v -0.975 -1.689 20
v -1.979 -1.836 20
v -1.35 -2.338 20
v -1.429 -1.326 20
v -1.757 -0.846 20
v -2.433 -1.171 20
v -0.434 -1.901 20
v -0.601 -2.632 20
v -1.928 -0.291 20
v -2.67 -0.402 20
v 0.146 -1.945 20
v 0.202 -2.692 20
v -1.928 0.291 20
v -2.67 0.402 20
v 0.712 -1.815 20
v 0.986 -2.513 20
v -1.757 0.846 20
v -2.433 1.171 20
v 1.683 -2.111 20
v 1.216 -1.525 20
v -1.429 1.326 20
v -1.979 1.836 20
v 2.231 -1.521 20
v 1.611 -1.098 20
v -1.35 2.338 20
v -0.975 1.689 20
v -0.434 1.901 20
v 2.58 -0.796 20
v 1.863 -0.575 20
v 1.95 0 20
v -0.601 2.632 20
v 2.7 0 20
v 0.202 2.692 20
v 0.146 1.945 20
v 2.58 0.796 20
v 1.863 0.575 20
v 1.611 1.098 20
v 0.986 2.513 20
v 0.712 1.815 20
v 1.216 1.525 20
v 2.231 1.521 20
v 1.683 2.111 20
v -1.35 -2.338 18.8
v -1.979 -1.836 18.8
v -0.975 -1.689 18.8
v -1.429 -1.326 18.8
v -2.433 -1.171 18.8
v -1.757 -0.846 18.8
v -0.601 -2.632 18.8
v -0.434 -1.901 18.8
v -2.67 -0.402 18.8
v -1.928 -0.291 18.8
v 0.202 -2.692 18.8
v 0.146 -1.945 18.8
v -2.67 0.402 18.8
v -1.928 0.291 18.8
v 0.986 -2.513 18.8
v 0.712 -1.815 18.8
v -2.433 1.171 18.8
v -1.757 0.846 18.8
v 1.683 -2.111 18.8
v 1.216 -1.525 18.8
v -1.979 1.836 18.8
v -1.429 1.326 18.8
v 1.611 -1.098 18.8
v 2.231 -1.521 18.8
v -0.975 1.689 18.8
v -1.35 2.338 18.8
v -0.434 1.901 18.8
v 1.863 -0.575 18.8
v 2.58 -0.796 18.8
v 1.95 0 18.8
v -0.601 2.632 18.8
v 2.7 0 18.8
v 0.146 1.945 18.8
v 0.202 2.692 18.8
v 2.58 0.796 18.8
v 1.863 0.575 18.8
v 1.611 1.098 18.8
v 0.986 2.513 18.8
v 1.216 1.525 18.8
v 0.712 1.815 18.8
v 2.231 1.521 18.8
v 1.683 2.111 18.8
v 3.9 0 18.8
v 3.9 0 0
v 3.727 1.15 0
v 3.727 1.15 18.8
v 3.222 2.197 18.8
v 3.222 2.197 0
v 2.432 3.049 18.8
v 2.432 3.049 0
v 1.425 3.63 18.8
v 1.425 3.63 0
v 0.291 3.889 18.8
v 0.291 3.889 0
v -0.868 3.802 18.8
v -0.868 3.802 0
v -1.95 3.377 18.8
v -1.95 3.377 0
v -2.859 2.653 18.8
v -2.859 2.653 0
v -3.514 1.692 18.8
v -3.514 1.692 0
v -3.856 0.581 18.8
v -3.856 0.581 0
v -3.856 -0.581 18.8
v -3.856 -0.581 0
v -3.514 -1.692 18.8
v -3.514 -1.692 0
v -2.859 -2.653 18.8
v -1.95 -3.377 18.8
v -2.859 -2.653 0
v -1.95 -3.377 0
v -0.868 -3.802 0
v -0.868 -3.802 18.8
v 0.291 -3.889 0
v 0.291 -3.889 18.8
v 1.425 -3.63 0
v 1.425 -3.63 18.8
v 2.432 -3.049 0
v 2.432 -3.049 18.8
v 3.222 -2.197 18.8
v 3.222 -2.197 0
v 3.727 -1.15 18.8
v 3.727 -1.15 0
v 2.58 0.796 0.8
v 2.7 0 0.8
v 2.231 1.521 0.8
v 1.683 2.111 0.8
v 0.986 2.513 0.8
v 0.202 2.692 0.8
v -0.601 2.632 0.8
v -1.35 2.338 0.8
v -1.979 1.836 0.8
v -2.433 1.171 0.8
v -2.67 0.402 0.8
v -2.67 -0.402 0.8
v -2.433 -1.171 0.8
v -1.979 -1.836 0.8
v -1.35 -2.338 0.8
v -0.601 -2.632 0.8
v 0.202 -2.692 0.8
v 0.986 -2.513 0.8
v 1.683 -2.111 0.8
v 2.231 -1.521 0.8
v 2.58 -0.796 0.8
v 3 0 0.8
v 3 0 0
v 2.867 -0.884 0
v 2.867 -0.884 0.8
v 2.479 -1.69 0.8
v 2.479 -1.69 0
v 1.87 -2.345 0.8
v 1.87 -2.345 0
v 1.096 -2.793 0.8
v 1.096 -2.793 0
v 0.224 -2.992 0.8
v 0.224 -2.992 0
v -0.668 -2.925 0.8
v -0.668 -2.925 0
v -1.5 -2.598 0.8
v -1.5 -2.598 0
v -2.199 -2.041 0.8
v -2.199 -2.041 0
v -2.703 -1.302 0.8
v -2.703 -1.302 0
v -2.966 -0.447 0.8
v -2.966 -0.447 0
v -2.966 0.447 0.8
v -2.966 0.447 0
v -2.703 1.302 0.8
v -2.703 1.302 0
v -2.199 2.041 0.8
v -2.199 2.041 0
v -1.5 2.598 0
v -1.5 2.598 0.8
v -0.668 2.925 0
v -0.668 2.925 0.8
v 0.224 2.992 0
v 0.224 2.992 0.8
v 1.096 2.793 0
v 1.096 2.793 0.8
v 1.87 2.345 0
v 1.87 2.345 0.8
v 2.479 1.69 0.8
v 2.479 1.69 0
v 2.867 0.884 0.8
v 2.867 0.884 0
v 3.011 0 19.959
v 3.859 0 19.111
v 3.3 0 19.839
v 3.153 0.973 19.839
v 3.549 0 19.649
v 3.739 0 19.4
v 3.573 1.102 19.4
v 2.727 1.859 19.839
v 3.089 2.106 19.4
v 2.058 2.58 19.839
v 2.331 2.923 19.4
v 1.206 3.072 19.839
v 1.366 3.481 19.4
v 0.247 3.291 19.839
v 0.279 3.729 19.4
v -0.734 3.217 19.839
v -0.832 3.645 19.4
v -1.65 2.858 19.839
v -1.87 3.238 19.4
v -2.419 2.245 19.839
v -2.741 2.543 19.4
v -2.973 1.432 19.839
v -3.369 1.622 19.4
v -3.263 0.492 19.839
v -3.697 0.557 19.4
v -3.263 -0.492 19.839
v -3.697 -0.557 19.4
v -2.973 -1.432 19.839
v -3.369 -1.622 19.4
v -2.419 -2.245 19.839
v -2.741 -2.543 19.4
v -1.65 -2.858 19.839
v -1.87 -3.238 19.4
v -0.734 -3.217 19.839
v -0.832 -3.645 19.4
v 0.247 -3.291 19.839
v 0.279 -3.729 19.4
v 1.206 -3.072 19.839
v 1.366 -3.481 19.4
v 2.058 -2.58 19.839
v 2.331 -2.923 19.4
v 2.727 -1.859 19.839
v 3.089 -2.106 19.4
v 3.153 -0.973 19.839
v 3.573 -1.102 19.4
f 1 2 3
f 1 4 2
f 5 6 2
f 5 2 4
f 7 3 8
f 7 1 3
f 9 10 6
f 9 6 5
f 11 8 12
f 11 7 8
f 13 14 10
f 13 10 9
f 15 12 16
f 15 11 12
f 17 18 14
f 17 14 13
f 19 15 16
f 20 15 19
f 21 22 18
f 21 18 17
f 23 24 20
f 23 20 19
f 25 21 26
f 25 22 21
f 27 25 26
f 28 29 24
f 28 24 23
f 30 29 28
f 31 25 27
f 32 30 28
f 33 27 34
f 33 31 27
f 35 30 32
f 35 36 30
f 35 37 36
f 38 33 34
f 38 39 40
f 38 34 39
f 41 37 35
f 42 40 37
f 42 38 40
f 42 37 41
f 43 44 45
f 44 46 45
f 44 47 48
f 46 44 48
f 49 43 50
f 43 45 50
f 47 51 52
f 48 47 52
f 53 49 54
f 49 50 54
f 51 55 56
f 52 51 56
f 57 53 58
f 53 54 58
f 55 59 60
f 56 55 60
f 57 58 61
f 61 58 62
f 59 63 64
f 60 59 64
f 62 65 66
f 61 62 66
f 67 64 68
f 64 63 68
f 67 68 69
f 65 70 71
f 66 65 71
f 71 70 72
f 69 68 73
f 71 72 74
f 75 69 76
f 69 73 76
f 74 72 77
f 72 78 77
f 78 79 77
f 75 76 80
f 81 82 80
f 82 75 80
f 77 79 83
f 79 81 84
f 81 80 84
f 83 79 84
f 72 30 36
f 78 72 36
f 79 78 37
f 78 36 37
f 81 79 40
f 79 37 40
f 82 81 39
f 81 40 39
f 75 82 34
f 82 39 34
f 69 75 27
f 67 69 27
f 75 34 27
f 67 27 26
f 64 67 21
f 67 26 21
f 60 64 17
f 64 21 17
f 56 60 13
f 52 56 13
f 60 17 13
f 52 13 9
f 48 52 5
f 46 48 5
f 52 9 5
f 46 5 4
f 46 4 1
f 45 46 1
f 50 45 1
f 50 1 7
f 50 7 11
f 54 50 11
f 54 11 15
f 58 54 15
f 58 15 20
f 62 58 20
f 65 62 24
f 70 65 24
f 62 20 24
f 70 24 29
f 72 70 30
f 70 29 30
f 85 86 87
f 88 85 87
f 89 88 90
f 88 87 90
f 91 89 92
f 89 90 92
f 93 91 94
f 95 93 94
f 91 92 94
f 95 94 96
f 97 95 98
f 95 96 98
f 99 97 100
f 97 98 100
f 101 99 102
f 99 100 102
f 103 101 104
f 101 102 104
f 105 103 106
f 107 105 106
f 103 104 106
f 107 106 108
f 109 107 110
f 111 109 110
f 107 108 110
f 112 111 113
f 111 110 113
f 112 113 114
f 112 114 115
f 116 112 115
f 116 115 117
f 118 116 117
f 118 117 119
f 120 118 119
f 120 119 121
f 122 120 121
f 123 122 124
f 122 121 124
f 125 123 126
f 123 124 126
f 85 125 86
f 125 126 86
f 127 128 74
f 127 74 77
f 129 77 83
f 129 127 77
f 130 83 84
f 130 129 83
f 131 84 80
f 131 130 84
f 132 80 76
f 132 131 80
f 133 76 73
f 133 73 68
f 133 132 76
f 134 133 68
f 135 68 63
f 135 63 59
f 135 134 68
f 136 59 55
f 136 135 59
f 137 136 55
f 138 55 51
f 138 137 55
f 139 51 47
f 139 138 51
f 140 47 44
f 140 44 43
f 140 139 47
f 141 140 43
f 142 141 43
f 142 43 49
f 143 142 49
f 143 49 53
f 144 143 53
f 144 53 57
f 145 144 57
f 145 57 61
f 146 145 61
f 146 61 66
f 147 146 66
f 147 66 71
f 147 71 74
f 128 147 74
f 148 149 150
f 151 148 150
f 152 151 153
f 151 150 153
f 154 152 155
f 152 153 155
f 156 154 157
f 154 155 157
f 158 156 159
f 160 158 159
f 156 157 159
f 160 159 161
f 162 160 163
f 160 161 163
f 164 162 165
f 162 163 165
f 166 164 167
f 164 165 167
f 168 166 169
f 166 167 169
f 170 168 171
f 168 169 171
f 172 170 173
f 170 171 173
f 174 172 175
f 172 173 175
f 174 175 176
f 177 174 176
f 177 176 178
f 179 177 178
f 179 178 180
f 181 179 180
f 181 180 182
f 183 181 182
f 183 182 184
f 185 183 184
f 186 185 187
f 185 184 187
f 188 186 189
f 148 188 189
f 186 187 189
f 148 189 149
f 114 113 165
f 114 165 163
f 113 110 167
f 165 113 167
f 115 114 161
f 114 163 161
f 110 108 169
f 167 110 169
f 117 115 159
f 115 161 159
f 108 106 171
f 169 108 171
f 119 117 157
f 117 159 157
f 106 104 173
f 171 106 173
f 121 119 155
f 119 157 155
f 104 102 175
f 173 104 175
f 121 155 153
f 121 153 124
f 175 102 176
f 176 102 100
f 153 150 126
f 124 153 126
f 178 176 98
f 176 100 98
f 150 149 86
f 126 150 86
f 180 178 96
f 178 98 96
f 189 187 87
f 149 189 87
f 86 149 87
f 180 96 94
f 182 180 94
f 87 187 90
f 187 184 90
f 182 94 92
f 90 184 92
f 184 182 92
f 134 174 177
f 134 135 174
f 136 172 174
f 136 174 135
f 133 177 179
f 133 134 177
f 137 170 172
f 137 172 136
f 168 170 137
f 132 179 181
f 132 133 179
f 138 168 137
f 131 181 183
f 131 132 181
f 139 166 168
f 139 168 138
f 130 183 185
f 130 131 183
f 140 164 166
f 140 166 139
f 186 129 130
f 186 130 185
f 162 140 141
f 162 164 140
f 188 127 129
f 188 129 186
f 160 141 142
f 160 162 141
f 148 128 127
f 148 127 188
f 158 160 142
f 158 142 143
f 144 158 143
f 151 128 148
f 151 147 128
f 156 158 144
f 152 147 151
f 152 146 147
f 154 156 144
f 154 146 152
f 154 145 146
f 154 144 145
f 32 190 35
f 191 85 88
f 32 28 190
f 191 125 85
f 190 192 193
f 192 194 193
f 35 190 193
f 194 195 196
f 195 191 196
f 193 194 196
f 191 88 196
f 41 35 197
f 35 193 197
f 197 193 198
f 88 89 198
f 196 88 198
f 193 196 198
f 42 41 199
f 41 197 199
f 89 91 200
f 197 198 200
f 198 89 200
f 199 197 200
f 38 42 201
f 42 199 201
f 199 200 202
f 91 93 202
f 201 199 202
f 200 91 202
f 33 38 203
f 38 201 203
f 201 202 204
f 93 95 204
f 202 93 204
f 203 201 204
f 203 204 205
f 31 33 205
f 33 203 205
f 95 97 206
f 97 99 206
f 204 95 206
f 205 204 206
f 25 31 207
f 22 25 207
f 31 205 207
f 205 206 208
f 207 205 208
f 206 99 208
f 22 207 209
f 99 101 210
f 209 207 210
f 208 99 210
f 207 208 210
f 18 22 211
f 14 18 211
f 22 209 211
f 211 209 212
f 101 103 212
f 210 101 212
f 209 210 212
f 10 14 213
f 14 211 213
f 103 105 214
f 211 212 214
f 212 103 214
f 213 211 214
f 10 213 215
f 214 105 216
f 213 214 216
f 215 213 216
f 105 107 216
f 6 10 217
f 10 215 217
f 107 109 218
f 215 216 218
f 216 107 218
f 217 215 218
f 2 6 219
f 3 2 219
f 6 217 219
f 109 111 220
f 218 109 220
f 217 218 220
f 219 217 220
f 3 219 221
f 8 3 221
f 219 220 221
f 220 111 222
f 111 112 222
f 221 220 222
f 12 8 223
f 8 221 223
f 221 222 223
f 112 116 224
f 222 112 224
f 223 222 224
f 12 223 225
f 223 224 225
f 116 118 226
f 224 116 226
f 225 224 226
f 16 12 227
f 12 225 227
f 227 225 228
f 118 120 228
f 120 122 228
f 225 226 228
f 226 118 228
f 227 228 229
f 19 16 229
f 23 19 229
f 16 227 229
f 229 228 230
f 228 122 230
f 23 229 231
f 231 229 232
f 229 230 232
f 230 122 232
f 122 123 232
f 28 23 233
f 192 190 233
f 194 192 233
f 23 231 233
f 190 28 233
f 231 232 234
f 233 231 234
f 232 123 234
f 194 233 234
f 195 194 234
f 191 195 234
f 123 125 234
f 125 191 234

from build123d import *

# Parameters (mm, degrees)
F0_R     = 3.9
F0_R_2   = 2.7
F1_DEPTH = 20
F2_R     = 2.7
F2_R_2   = 1.95
F3_DEPTH = 1.2
F4_R     = 1.2
F5_R     = 3
F6_DEPTH = 0.8


with BuildPart() as f1:
    # F0 (on Top) → F1 (new body)
    with BuildSketch(Plane.XY):
        Circle(F0_R)
        Circle(F0_R_2, mode=Mode.SUBTRACT)
    extrude(amount=F1_DEPTH)

    # F2 (on face) → F3 (join)
    with BuildSketch(Plane.XY.offset(20)):
        Circle(F2_R)
        Circle(F2_R_2, mode=Mode.SUBTRACT)
    extrude(amount=-F3_DEPTH)

    # F4
    f4_edges = [f1.edges().sort_by_distance(p)[0] for p in [
        (-3.9, 0, 20),
    ]]
    fillet(f4_edges, radius=F4_R)

    # F5 (on face) → F6 (cut)
    with BuildSketch(Plane(origin=(0, 0, 0), x_dir=(1, 0, 0), z_dir=(0, 0, -1))):
        Circle(F5_R)
    extrude(amount=-F6_DEPTH, mode=Mode.SUBTRACT)


solid = f1.part
